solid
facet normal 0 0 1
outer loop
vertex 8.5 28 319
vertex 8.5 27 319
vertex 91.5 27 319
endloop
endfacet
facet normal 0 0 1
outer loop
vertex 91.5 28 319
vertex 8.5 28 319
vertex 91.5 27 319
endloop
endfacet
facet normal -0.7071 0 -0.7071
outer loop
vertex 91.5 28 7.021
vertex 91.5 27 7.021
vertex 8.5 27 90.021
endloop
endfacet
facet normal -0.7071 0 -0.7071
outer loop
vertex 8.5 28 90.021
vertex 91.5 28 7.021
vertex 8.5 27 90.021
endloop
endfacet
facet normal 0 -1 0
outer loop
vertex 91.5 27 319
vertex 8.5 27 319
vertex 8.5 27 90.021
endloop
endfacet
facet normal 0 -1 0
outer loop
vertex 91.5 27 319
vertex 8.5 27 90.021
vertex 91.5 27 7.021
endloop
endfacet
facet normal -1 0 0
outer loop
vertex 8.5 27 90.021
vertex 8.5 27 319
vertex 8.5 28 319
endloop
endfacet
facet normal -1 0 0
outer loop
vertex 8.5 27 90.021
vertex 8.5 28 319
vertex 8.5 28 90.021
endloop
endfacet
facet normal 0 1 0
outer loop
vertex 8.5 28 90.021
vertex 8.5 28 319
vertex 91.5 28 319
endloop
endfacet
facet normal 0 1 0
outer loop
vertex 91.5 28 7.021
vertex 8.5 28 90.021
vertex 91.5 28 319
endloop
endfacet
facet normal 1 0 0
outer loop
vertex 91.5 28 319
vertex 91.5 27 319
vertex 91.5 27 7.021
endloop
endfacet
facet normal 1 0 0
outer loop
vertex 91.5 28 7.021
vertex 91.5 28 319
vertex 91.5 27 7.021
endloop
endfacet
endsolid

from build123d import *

# Parameters (mm, degrees)
BOSS_EXTRUDE1_DEPTH   = 327.5
BOSS_EXTRUDE1_2_DEPTH = 327.5
BOSS_EXTRUDE2_DEPTH   = 2
BOSS_EXTRUDE4_DEPTH   = 1
SKETCH4_W             = 100
SKETCH4_H             = 8.5
BOSS_EXTRUDE5_DEPTH   = 2
BOSS_EXTRUDE6_DEPTH   = 1
SKETCH7_R             = 5
SKETCH7_W             = 96
SKETCH7_H             = 1
CUT_EXTRUDE2_DEPTH    = 1
SKETCH8_W             = 100
SKETCH8_H             = 13.5
CUT_EXTRUDE3_DEPTH    = 400
SKETCH9_W             = 1
SKETCH9_H             = 5
CUT_EXTRUDE4_DEPTH    = 84.5
SKETCH10_W            = 83
SKETCH10_H            = 228.97918472
BOSS_EXTRUDE7_DEPTH   = 1
SKETCH12_W            = 120.619846079
SKETCH12_H            = 19.843524077
CUT_EXTRUDE6_DEPTH    = 400


with BuildPart() as part:
    # Sketch1 → Boss-Extrude1 (new body)
    with BuildSketch(Plane.XY):
        Polygon((0, 0), (0, 8.5), (1, 8.5), (1, 13.5), (2, 13.5), (2, 2), (13.5, 2), (13.5, 1), (8.5, 1), (8.5, 0), align=None)
    extrude(amount=BOSS_EXTRUDE1_DEPTH)



with BuildPart() as body_2:
    # Sketch1 → Boss-Extrude1 2 (new body)
    with BuildSketch(Plane.XY):
        Polygon((100, 0), (91.5, 0), (91.5, 1), (86.5, 1), (86.5, 2), (98, 2), (98, 13.5), (99, 13.5), (99, 8.5), (100, 8.5), align=None)
    extrude(amount=BOSS_EXTRUDE1_2_DEPTH)


with BuildPart() as part_1:
    add(part.part)

    add(body_2.part)  # Boss-Extrude2 merges body 2
    # Sketch2 → Boss-Extrude2 (add)
    with BuildSketch(Plane(origin=(0, 2, 0), x_dir=(1, 0, 0), z_dir=(0, 1, 0))):
        Polygon((86.5, 0), (13.5, -73), (13.5, -85.02081528), (86.5, -12.02081528), align=None)
    extrude(amount=-BOSS_EXTRUDE2_DEPTH)

    # Sketch3 → Boss-Extrude4 (add)
    with BuildSketch(Plane.XZ.offset(-1)):
        Polygon((13.5, 73), (13.5, 85.02081528), (8.5, 90.02081528), (8.5, 78), align=None)
        Polygon((86.5, 0), (86.5, 12.02081528), (91.5, 7.02081528), (91.5, 0), align=None)
    extrude(amount=BOSS_EXTRUDE4_DEPTH)

    # Sketch4 → Boss-Extrude5 (add)
    with BuildSketch(Plane.XZ):
        with Locations((50, 323.25)):
            Rectangle(SKETCH4_W, SKETCH4_H)
    extrude(amount=-BOSS_EXTRUDE5_DEPTH)

    # Sketch7 → Cut-Extrude2 (cut)
    with BuildSketch(Plane(origin=(0, 2, 0), x_dir=(1, 0, 0), z_dir=(0, 1, 0))):
        with Locations((26.5, -326.5)):
            Circle(SKETCH7_R)
        with Locations((73.5, -326.5)):
            Circle(SKETCH7_R)
        with Locations((50, -327)):
            Rectangle(SKETCH7_W, SKETCH7_H)
    extrude(amount=-CUT_EXTRUDE2_DEPTH, mode=Mode.SUBTRACT)


with BuildPart() as body_2_2:
    # Sketch5 → Boss-Extrude6 (new body)
    with BuildSketch(Plane(origin=(0, 2, 0), x_dir=(1, 0, 0), z_dir=(0, 1, 0))):
        Polygon((13.5, -65.928932188), (79.428932188, 0), (86.5, 0), (13.5, -73), align=None)
    extrude(amount=-BOSS_EXTRUDE6_DEPTH)


with BuildPart() as body_3:
    # Mirror1: mirrored copy
    add(body_2_2.part.mirror(Plane(origin=(1, 13.5, 327.5), x_dir=(0, 0, 1), z_dir=(0, -1, 0))))


with BuildPart() as body_4:
    # Mirror1 2: mirrored copy
    add(part_1.part.mirror(Plane(origin=(1, 13.5, 327.5), x_dir=(0, 0, 1), z_dir=(0, -1, 0))))

    # Sketch9 → Cut-Extrude4 (cut)
    with BuildSketch(Plane(origin=(0, 0, 0), x_dir=(-1, 0, 0), z_dir=(0, 0, -1))):
        with Locations((-1.5, 16)):
            Rectangle(SKETCH9_W, SKETCH9_H)
    extrude(amount=-CUT_EXTRUDE4_DEPTH, mode=Mode.SUBTRACT)


with BuildPart() as cut_extrude3_tool:
    # Sketch8 → Cut-Extrude3 (new body)
    with BuildSketch(Plane(origin=(0, 0, 0), x_dir=(-1, 0, 0), z_dir=(0, 0, -1))):
        with Locations((-50, 6.75)):
            Rectangle(SKETCH8_W, SKETCH8_H)
    extrude(amount=-CUT_EXTRUDE3_DEPTH)


with BuildPart() as part_2:
    add(part_1.part)

    # Cut-Extrude3: cut by cut_extrude3_tool
    add(cut_extrude3_tool.part, mode=Mode.SUBTRACT)


with BuildPart() as body_2_2_1:
    add(body_2_2.part)

    # Cut-Extrude3: cut by cut_extrude3_tool
    add(cut_extrude3_tool.part, mode=Mode.SUBTRACT)


with BuildPart() as body_3_2:
    # Sketch10 → Boss-Extrude7 (new body)
    with BuildSketch(Plane(origin=(0, 27, 0), x_dir=(1, 0, 0), z_dir=(0, 1, 0))):
        Polygon((91.5, -7.02081528), (8.5, -90.02081528), (91.5, -90.02081528), align=None)
        with Locations((50, -204.51040764)):
            Rectangle(SKETCH10_W, SKETCH10_H)
    extrude(amount=BOSS_EXTRUDE7_DEPTH)


with BuildPart() as cut_extrude6_tool:
    # Sketch12 → Cut-Extrude6 (new body)
    with BuildSketch(Plane.XY.offset(327.5)):
        with Locations((60.30992304, 17.078237962)):
            Rectangle(SKETCH12_W, SKETCH12_H)
    extrude(amount=-CUT_EXTRUDE6_DEPTH)


with BuildPart() as body_3_1:
    add(body_3.part)

    # Cut-Extrude6: cut by cut_extrude6_tool
    add(cut_extrude6_tool.part, mode=Mode.SUBTRACT)


with BuildPart() as body_4_1:
    add(body_4.part)

    # Cut-Extrude6: cut by cut_extrude6_tool
    add(cut_extrude6_tool.part, mode=Mode.SUBTRACT)


solid = body_3_2.part
